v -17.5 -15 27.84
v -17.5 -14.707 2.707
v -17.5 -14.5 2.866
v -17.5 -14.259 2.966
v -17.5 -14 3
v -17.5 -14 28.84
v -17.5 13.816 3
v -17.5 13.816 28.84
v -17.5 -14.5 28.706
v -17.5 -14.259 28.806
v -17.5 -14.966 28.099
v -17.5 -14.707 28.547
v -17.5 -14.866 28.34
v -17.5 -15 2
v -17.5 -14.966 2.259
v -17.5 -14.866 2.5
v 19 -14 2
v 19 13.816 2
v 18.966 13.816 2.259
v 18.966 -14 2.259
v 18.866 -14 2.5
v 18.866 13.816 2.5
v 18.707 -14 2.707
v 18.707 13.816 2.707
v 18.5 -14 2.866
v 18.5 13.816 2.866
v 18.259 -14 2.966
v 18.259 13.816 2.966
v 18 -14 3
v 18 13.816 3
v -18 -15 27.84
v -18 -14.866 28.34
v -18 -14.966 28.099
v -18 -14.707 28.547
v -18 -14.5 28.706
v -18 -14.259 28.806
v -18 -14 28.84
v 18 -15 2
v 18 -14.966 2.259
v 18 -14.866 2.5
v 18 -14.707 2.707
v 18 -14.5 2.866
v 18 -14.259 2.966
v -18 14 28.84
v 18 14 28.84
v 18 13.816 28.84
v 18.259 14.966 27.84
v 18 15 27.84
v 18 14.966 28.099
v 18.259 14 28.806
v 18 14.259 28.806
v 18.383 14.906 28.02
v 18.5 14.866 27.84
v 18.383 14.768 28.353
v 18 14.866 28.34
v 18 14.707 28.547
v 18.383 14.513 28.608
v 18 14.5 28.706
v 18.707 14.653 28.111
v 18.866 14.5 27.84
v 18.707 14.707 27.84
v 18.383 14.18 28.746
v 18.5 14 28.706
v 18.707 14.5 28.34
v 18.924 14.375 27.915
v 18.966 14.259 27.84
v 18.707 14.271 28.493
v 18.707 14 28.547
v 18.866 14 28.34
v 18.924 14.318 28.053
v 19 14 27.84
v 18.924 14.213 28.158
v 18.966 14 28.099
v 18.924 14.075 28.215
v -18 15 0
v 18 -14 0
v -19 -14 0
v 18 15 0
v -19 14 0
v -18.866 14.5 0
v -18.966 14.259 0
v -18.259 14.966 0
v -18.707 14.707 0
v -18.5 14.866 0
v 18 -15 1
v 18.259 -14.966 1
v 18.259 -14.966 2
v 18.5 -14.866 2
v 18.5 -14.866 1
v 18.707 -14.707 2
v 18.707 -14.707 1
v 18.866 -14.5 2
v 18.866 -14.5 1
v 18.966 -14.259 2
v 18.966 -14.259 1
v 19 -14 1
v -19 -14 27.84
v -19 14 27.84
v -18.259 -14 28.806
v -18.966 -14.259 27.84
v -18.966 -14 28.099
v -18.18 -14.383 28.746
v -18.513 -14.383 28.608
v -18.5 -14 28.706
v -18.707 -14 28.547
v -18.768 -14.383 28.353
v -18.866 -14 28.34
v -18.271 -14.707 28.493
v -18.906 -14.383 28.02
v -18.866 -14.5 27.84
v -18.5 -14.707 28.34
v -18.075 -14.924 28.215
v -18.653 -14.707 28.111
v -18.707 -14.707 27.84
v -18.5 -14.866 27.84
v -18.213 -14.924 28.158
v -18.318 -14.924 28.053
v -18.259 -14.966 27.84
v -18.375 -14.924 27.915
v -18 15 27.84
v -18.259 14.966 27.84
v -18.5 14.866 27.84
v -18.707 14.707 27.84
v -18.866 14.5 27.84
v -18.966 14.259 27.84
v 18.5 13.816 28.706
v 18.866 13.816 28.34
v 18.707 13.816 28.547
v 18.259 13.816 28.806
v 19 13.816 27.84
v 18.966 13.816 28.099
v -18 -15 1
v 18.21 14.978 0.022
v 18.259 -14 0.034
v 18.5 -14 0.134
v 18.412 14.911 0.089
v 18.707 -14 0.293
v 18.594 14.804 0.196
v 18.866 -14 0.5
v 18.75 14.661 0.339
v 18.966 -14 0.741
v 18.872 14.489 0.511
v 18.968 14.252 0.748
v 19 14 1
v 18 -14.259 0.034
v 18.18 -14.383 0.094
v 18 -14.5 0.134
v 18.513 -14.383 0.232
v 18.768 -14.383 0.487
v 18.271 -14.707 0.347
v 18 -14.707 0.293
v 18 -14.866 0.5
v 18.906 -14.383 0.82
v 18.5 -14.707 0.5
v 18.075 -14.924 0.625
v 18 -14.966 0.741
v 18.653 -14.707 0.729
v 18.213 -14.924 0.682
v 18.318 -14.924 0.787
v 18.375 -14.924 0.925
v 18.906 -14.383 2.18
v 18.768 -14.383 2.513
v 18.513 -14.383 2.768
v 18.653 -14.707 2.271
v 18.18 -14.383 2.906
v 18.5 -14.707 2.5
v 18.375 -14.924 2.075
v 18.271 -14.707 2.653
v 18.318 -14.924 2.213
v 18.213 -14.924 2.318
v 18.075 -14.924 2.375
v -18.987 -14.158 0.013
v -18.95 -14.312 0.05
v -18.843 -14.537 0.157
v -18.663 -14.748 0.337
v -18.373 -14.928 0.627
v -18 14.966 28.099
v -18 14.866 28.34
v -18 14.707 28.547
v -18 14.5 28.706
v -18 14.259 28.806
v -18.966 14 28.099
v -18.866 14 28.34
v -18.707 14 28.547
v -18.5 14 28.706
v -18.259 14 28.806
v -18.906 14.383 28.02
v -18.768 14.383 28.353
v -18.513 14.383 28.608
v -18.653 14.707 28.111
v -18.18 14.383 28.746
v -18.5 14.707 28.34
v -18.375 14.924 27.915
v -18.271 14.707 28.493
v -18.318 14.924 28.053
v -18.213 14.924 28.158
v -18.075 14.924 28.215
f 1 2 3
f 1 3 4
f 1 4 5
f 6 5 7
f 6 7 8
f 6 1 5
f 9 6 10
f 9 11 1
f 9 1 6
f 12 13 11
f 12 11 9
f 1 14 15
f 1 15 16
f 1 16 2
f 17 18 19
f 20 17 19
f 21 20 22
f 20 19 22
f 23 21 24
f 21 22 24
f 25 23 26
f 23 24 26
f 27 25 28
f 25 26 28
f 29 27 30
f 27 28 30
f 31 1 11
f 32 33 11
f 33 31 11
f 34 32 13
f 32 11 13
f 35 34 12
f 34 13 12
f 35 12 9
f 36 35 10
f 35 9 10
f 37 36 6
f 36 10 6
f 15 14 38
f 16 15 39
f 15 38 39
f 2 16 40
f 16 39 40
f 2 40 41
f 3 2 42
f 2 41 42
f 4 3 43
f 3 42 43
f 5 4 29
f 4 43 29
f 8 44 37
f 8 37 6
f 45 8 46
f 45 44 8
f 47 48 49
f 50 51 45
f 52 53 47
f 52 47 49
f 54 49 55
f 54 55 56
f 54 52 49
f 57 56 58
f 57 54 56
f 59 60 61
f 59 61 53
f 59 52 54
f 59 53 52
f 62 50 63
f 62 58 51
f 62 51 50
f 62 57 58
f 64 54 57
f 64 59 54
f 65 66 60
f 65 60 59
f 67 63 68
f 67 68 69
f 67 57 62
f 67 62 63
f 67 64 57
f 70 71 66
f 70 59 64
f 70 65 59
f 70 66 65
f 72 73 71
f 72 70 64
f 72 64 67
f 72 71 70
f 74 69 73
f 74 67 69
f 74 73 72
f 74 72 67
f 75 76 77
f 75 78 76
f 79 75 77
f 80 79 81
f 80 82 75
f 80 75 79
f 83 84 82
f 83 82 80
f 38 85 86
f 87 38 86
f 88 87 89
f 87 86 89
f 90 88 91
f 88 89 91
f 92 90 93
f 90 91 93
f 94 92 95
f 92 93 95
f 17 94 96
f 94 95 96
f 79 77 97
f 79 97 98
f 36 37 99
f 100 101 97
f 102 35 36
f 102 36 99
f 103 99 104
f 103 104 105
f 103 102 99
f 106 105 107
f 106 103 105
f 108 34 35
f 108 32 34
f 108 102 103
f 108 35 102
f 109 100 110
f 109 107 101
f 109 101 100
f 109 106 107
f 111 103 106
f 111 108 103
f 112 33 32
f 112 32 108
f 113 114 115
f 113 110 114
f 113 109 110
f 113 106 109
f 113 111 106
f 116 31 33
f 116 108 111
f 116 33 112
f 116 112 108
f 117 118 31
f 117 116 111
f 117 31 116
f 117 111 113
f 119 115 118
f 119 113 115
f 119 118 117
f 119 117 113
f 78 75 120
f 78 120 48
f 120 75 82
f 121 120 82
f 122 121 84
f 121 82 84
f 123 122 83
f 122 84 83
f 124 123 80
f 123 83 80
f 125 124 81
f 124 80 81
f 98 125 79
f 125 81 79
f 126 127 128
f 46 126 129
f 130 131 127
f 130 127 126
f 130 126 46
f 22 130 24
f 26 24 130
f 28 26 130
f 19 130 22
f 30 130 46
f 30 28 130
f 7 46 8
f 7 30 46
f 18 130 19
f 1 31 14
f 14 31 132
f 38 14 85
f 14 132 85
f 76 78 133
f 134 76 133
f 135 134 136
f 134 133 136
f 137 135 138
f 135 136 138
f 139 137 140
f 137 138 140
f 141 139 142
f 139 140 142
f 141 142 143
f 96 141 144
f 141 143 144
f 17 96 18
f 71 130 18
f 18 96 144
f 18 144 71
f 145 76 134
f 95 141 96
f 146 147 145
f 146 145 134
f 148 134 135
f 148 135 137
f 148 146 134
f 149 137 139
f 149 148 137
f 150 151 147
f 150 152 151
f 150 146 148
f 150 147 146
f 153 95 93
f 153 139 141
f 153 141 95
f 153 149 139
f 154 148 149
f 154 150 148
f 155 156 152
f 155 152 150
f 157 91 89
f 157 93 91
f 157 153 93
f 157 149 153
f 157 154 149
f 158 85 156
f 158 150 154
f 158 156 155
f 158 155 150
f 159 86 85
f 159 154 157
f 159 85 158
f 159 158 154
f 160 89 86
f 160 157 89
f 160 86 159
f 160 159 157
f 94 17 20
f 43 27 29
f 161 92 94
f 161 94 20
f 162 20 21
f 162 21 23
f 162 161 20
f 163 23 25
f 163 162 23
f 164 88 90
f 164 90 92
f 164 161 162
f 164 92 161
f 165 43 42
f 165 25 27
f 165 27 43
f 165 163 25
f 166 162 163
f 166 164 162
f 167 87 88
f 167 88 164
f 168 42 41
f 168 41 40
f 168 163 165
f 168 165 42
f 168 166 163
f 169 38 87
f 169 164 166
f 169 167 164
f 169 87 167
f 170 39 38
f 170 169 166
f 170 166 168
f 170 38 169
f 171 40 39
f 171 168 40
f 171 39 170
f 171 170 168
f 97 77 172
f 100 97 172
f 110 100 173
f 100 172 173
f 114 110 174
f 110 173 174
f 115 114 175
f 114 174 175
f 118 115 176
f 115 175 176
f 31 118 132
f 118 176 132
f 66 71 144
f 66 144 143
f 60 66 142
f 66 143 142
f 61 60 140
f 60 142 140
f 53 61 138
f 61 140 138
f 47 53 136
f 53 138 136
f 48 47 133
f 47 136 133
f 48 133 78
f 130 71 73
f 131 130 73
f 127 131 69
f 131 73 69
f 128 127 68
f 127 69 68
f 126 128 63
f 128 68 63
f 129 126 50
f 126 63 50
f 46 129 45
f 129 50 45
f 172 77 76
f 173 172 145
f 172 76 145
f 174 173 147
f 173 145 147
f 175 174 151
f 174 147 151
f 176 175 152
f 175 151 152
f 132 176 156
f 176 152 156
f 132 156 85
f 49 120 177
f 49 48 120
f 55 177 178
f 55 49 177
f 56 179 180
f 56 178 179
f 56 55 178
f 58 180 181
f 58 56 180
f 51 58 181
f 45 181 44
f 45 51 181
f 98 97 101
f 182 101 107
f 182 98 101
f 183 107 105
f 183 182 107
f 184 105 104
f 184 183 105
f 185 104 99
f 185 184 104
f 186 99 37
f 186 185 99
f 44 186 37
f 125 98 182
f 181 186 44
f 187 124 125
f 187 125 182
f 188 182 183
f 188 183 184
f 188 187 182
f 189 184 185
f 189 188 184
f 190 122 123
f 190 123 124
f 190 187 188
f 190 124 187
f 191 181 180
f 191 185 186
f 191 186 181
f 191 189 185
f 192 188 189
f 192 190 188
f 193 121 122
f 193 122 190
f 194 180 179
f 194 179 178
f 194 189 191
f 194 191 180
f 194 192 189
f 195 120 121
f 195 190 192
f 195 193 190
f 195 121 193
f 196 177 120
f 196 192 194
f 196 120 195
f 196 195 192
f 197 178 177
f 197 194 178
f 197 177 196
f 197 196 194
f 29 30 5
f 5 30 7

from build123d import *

# Parameters (mm, degrees)
SKETCH1_W           = 38
SKETCH1_H           = 30
SKETCH1_W_2         = 35
SKETCH1_H_2         = 27.631578948
BOSS_EXTRUDE1_DEPTH = 28.84
FILLET1_R           = 1
SKETCH2_W           = 35
SKETCH2_H           = 27.631578948
BOSS_EXTRUDE2_DEPTH = 3
SKETCH3_W           = 36.5
SKETCH3_H           = 28.815789474
CUT_EXTRUDE1_DEPTH  = 36.407705376
FILLET2_R           = 1


with BuildPart() as part:
    # Sketch1 → Boss-Extrude1 (new body)
    with BuildSketch(Plane.XY):
        Rectangle(SKETCH1_W, SKETCH1_H)
        Rectangle(SKETCH1_W_2, SKETCH1_H_2, mode=Mode.SUBTRACT)
    extrude(amount=BOSS_EXTRUDE1_DEPTH)

    # Fillet1
    fillet1_edges = [part.edges().sort_by_distance(p)[0] for p in [
        (19, 0, 28.84),
        (0, 15, 28.84),
        (-19, 0, 28.84),
        (0, -15, 28.84),
    ]]
    fillet(fillet1_edges, radius=FILLET1_R)

    # Sketch2 → Boss-Extrude2 (add)
    with BuildSketch(Plane(origin=(0, 0, 0), x_dir=(-1, 0, 0), z_dir=(0, 0, -1))):
        Rectangle(SKETCH2_W, SKETCH2_H)
    extrude(amount=-BOSS_EXTRUDE2_DEPTH)

    # Sketch3 → Cut-Extrude1 (cut, through all)
    with BuildSketch(Plane(origin=(0, 0, 3), x_dir=(-1, 0, 0), z_dir=(0, 0, -1))):
        with Locations((-0.75, -0.592105263)):
            Rectangle(SKETCH3_W, SKETCH3_H)
    extrude(amount=-CUT_EXTRUDE1_DEPTH, mode=Mode.SUBTRACT)

    # Fillet2
    # the kernel refuses this fillet: 1 mm, written as the material it takes off along each edge
    with BuildSketch(Plane(origin=(-18, -14, 27.84), x_dir=(-1, 0, 0), z_dir=(0, -1, 0))) as fillet2_piece_1_section:
        Polygon((0, 0), (FILLET2_R * 1.02, 0), (FILLET2_R * 1.02, -FILLET2_R * 1.02), (0, -FILLET2_R * 1.02), align=None)
    fillet2_piece_1 = extrude(amount=FILLET2_R * 1.02, mode=Mode.PRIVATE)
    fillet2_piece_1 = fillet2_piece_1 - Plane(origin=(-18, -14, 27.84), x_dir=(0.7071067811865475, 0, -0.7071067811865475), z_dir=(0, -1, 0)) * Sphere(FILLET2_R, mode=Mode.PRIVATE)
    add(fillet2_piece_1, mode=Mode.SUBTRACT)
    with BuildSketch(Plane(origin=(-18, 14, 27.84), x_dir=(-1, 0, 0), z_dir=(0, 1, 0))) as fillet2_piece_2_section:
        Polygon((0, 0), (FILLET2_R * 1.02, 0), (FILLET2_R * 1.02, FILLET2_R * 1.02), (0, FILLET2_R * 1.02), align=None)
    fillet2_piece_2 = extrude(amount=FILLET2_R * 1.02, mode=Mode.PRIVATE)
    fillet2_piece_2 = fillet2_piece_2 - Plane(origin=(-18, 14, 27.84), x_dir=(0.7071067811865475, 0, -0.7071067811865475), z_dir=(0, 1, 0)) * Sphere(FILLET2_R, mode=Mode.PRIVATE)
    add(fillet2_piece_2, mode=Mode.SUBTRACT)
    with BuildSketch(Plane(origin=(18, 14, 27.84), x_dir=(0, 1, 0), z_dir=(1, 0, 0))) as fillet2_piece_3_section:
        Polygon((0, 0), (FILLET2_R * 1.02, 0), (FILLET2_R * 1.02, FILLET2_R * 1.02), (0, FILLET2_R * 1.02), align=None)
    fillet2_piece_3 = extrude(amount=FILLET2_R * 1.02, mode=Mode.PRIVATE)
    fillet2_piece_3 = fillet2_piece_3 - Plane(origin=(18, 14, 27.84), x_dir=(0, -0.7071067811865475, -0.7071067811865475), z_dir=(1, 0, 0)) * Sphere(FILLET2_R, mode=Mode.PRIVATE)
    add(fillet2_piece_3, mode=Mode.SUBTRACT)
    with BuildSketch(Plane(origin=(18, -14, 1), x_dir=(1, 0, 0), z_dir=(0, -1, 0))) as fillet2_piece_4_section:
        Polygon((0, 0), (FILLET2_R * 1.02, 0), (FILLET2_R * 1.02, -FILLET2_R * 1.02), (0, -FILLET2_R * 1.02), align=None)
    fillet2_piece_4 = extrude(amount=FILLET2_R * 1.02, mode=Mode.PRIVATE)
    fillet2_piece_4 = fillet2_piece_4 - Plane(origin=(18, -14, 1), x_dir=(-0.7071067811865475, 0, 0.7071067811865475), z_dir=(0, -1, 0)) * Sphere(FILLET2_R, mode=Mode.PRIVATE)
    add(fillet2_piece_4, mode=Mode.SUBTRACT)
    with BuildSketch(Plane(origin=(18, -14, 2), x_dir=(1, 0, 0), z_dir=(0, -1, 0))) as fillet2_piece_5_section:
        Polygon((0, 0), (FILLET2_R * 1.02, 0), (FILLET2_R * 1.02, FILLET2_R * 1.02), (0, FILLET2_R * 1.02), align=None)
    fillet2_piece_5 = extrude(amount=FILLET2_R * 1.02, mode=Mode.PRIVATE)
    fillet2_piece_5 = fillet2_piece_5 - Plane(origin=(18, -14, 2), x_dir=(-0.7071067811865475, 0, -0.7071067811865475), z_dir=(0, -1, 0)) * Sphere(FILLET2_R, mode=Mode.PRIVATE)
    add(fillet2_piece_5, mode=Mode.SUBTRACT)
    with BuildSketch(Plane(origin=(19, 15, -2.5), x_dir=(0, -1, 0), z_dir=(0, 0, 1)), Plane(origin=(-19, 15, -2.5), x_dir=(1, 0, 0), z_dir=(0, 0, 1))) as fillet2_piece_6:
        with BuildLine():
            CenterArc((FILLET2_R, -FILLET2_R), FILLET2_R, 90, 90)
            Line((0, -FILLET2_R), (0, 0))
            Line((0, 0), (FILLET2_R, 0))
        make_face()
    extrude(amount=30.34, mode=Mode.SUBTRACT)
    with BuildSketch(Plane(origin=(-19, -15, -2.5), x_dir=(1, 0, 0), z_dir=(0, 0, 1))) as fillet2_piece_7:
        with BuildLine():
            CenterArc((FILLET2_R, FILLET2_R), FILLET2_R, 180, 90)
            Line((0, FILLET2_R), (0, 0))
            Line((0, 0), (FILLET2_R, 0))
        make_face()
    extrude(amount=30.34, mode=Mode.SUBTRACT)
    with BuildSketch(Plane(origin=(19, 17.5, 0), x_dir=(0, 0, 1), z_dir=(0, -1, 0))) as fillet2_piece_8:
        with BuildLine():
            CenterArc((FILLET2_R, FILLET2_R), FILLET2_R, 180, 90)
            Line((0, FILLET2_R), (0, 0))
            Line((0, 0), (FILLET2_R, 0))
        make_face()
    extrude(amount=31.5, mode=Mode.SUBTRACT)
    with BuildSketch(Plane(origin=(18, -15, 0), x_dir=(0, 0, 1), z_dir=(-1, 0, 0))) as fillet2_piece_9:
        with BuildLine():
            CenterArc((FILLET2_R, FILLET2_R), FILLET2_R, 180, 90)
            Line((0, FILLET2_R), (0, 0))
            Line((0, 0), (FILLET2_R, 0))
        make_face()
    extrude(amount=39.5, mode=Mode.SUBTRACT)
    with BuildSketch(Plane(origin=(19, -15, 1), x_dir=(-1, 0, 0), z_dir=(0, 0, 1))) as fillet2_piece_10:
        with BuildLine():
            CenterArc((FILLET2_R, -FILLET2_R), FILLET2_R, 90, 90)
            Line((0, -FILLET2_R), (0, 0))
            Line((0, 0), (FILLET2_R, 0))
        make_face()
    extrude(amount=1, mode=Mode.SUBTRACT)
    with BuildSketch(Plane(origin=(19, 13.815789474, 3), x_dir=(0, 0, -1), z_dir=(0, -1, 0))) as fillet2_piece_11:
        with BuildLine():
            CenterArc((FILLET2_R, -FILLET2_R), FILLET2_R, 90, 90)
            Line((0, -FILLET2_R), (0, 0))
            Line((0, 0), (FILLET2_R, 0))
        make_face()
    extrude(amount=27.815789474, mode=Mode.SUBTRACT)
    with BuildSketch(Plane(origin=(18, -15, 3), x_dir=(0, 0, -1), z_dir=(-1, 0, 0))) as fillet2_piece_12:
        with BuildLine():
            CenterArc((FILLET2_R, -FILLET2_R), FILLET2_R, 90, 90)
            Line((0, -FILLET2_R), (0, 0))
            Line((0, 0), (FILLET2_R, 0))
        make_face()
    extrude(amount=35.5, mode=Mode.SUBTRACT)


solid = part.part
